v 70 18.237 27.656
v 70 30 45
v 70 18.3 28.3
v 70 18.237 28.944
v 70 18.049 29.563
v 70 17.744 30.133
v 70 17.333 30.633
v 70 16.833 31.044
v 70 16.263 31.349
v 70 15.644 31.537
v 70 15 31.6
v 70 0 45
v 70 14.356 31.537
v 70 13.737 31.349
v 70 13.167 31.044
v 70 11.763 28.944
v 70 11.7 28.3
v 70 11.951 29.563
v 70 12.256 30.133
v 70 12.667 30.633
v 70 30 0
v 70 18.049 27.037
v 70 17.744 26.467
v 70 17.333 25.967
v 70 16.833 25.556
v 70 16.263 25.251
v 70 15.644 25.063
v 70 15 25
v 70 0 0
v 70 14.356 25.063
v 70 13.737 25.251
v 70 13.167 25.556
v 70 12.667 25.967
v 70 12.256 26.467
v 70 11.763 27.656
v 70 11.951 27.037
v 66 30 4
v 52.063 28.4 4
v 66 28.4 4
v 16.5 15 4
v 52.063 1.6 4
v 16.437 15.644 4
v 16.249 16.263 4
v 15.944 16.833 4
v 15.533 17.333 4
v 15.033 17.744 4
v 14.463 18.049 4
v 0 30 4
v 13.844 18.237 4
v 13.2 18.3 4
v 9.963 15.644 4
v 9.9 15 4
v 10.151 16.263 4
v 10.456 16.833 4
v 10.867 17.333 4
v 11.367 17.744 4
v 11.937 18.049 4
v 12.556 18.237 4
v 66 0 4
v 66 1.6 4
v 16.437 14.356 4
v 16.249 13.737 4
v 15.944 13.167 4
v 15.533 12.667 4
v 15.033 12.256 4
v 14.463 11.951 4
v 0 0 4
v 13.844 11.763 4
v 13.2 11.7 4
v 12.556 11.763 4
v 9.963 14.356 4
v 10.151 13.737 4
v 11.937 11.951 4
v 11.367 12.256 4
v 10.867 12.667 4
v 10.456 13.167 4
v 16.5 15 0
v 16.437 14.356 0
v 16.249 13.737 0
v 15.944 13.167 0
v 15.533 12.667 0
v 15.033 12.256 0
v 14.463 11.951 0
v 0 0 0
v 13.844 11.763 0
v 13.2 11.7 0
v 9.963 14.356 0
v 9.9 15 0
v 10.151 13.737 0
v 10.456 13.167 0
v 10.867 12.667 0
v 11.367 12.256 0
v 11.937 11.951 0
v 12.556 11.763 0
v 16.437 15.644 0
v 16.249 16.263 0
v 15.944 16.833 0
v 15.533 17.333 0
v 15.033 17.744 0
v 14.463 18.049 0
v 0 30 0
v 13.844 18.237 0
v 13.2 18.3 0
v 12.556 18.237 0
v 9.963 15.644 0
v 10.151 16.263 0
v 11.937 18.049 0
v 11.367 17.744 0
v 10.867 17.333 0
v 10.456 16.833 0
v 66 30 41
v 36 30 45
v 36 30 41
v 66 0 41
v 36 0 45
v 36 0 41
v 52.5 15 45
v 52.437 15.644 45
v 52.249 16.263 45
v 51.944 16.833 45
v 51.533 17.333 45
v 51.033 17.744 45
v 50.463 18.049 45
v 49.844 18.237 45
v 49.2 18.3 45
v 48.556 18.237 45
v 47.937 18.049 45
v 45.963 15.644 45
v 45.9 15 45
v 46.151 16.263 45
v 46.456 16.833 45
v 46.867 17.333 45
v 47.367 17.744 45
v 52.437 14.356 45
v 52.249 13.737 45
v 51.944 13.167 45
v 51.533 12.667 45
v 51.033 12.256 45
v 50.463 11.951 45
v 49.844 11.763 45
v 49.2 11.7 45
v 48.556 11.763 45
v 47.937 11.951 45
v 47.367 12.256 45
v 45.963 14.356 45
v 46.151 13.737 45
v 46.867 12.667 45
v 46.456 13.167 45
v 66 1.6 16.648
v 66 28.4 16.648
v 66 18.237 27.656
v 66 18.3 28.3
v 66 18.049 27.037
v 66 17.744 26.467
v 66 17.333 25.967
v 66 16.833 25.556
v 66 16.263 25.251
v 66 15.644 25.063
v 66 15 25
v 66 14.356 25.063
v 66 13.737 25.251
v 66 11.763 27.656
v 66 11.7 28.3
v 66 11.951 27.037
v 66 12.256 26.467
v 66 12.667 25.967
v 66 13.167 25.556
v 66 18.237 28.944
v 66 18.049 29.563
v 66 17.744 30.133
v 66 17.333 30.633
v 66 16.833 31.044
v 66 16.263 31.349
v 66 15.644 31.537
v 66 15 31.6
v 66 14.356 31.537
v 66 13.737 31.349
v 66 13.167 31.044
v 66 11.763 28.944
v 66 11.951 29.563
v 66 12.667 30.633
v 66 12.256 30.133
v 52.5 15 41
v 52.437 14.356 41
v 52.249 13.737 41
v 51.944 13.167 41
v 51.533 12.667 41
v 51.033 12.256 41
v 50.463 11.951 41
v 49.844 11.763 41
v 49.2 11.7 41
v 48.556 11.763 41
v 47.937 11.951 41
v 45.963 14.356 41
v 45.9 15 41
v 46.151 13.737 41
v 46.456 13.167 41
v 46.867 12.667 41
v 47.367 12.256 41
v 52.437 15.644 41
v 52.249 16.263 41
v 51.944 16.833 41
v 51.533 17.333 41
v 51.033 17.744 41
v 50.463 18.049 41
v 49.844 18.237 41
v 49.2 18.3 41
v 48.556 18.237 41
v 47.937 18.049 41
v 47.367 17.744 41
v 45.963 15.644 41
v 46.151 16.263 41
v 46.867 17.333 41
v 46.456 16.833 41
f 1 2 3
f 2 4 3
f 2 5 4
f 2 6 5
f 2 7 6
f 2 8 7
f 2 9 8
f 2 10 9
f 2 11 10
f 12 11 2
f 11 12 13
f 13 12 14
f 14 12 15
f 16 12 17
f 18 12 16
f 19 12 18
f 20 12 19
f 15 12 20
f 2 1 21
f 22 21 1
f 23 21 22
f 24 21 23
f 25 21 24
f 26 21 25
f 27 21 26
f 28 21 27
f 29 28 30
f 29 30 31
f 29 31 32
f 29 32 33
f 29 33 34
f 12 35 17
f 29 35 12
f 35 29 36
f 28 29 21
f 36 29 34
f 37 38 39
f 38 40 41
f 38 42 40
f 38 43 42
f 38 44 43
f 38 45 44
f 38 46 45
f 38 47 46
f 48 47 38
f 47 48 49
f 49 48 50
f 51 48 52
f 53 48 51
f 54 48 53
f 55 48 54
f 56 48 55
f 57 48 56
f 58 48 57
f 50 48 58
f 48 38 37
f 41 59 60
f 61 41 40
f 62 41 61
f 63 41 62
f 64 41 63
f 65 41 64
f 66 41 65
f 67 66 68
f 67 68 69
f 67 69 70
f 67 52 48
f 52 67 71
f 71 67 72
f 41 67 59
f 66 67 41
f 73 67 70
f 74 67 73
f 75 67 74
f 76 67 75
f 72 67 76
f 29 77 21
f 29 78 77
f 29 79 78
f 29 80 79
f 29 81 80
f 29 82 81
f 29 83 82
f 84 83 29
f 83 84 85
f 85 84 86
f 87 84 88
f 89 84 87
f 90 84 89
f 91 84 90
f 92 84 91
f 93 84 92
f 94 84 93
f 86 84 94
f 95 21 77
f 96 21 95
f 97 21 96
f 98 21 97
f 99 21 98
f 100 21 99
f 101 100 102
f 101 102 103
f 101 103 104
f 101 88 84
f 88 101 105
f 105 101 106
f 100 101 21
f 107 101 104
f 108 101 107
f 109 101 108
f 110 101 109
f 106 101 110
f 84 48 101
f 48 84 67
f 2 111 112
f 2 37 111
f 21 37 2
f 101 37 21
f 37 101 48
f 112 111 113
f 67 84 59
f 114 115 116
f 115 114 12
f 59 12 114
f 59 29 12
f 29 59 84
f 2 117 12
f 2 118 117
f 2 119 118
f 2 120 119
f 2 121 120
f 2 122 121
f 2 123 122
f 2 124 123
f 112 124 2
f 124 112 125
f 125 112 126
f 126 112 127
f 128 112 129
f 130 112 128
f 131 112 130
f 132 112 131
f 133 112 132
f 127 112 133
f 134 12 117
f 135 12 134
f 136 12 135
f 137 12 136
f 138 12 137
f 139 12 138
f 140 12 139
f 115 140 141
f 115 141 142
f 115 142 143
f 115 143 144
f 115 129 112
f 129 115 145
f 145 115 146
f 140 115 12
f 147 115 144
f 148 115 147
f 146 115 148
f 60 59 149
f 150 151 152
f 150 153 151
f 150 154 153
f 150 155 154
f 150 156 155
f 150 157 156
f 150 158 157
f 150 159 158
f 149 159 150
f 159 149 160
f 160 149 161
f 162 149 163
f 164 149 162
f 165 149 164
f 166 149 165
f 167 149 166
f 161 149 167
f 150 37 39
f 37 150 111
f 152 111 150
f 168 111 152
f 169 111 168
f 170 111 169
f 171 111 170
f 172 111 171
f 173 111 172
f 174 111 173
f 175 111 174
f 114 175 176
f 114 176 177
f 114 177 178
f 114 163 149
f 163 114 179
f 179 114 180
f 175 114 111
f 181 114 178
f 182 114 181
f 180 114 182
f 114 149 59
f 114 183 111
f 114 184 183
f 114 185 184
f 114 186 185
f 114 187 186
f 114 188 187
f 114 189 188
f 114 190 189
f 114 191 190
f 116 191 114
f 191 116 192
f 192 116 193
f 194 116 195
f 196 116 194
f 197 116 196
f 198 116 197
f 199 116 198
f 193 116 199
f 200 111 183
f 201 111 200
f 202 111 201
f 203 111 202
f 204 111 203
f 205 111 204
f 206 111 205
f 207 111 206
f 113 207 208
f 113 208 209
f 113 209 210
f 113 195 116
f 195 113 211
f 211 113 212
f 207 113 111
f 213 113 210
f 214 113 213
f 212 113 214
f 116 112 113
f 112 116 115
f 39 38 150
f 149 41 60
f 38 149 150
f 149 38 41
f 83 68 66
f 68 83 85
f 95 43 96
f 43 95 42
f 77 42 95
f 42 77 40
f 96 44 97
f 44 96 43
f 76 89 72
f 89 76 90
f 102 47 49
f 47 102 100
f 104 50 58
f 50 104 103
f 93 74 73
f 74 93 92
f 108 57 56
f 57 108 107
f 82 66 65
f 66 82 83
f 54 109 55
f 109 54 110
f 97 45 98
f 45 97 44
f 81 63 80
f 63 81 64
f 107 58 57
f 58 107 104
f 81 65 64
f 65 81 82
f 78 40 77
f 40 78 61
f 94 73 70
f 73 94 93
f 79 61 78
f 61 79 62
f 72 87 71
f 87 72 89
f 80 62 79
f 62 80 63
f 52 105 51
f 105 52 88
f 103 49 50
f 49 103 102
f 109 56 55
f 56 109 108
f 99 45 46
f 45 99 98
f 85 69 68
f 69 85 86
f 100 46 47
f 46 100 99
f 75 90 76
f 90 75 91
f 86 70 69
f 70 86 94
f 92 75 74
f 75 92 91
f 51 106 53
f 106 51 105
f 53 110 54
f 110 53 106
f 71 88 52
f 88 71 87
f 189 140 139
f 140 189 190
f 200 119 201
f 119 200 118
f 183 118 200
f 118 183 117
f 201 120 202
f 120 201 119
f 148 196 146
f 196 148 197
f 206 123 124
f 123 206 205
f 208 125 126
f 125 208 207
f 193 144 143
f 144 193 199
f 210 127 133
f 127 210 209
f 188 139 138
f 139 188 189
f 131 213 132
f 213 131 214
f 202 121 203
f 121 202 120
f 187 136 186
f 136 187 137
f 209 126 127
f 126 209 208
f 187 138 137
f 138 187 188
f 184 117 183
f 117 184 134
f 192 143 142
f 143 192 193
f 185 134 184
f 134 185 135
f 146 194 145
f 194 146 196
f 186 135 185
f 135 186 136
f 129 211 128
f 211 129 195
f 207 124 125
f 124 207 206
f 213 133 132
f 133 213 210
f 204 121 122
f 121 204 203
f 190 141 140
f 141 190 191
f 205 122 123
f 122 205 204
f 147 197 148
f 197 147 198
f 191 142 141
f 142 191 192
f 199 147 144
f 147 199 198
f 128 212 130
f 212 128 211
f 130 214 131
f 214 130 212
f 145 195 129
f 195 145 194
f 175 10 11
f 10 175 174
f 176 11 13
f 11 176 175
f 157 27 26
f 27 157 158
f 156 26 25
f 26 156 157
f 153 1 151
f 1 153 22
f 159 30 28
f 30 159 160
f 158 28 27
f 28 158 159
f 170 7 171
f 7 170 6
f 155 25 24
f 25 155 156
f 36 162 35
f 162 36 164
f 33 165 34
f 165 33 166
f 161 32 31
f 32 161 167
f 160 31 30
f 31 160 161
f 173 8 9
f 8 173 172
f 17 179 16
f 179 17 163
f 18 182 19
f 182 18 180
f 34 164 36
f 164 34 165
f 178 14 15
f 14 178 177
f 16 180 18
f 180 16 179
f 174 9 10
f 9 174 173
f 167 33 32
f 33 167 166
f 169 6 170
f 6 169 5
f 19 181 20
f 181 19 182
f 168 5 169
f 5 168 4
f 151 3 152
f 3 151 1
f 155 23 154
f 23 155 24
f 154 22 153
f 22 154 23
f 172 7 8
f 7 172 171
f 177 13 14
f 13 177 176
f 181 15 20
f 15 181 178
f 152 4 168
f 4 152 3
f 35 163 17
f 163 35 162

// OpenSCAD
$fn = 32;

// ----------------------------------------------------------------------
// Z-bracket: 70 x 30 x 45 mm
// ----------------------------------------------------------------------

// --- parameters (mm) ---
bottom_run = 70;          // lower foot length, X
top_run = 30;             // upper foot length, X
profile_w = 30;           // bracket width, Y
height = 45;              // overall rise, Z
mat_t = 4;                // plate thickness
hole_d = 6.6;             // clearance for M6
rib_len = 15.7;           // gusset leg
rib_sink = 1.6;           // gusset overlap into the plates

module hole_z(px, py, z0) {
  translate([px, py, z0 - 2.5]) cylinder(h = mat_t + 5, d = hole_d);
}
module hole_x(py, pz) {
  translate([-2.5, py, pz]) rotate([0, 90, 0]) cylinder(h = mat_t + 5, d = hole_d);
}
module gusset(x0) {
  translate([x0, profile_w - rib_sink, 0])
    rotate([90, 0, 0])
      linear_extrude(height = profile_w - 2 * rib_sink)
        polygon(points = [[rib_sink, mat_t - rib_sink],
                          [rib_sink, mat_t - rib_sink + rib_len],
                          [-rib_len, mat_t - rib_sink]]);
}

difference() {
  union() {
    cube([bottom_run, profile_w, mat_t]);
    /* web, overlapping the lower foot */
    translate([bottom_run - mat_t, 0, 0]) cube([mat_t, profile_w, height]);
    /* upper foot, sunk into the web */
    translate([bottom_run - mat_t - top_run, 0, height - mat_t]) cube([top_run + mat_t, profile_w, mat_t]);
    gusset(bottom_run - mat_t);
  }
  hole_z(13.2, 15, 0);
  translate([bottom_run - mat_t - 16.8, 0, 0]) hole_z(0, 15, height - mat_t);
  translate([bottom_run - mat_t, 0, 0]) hole_x(15, 28.3);
}
